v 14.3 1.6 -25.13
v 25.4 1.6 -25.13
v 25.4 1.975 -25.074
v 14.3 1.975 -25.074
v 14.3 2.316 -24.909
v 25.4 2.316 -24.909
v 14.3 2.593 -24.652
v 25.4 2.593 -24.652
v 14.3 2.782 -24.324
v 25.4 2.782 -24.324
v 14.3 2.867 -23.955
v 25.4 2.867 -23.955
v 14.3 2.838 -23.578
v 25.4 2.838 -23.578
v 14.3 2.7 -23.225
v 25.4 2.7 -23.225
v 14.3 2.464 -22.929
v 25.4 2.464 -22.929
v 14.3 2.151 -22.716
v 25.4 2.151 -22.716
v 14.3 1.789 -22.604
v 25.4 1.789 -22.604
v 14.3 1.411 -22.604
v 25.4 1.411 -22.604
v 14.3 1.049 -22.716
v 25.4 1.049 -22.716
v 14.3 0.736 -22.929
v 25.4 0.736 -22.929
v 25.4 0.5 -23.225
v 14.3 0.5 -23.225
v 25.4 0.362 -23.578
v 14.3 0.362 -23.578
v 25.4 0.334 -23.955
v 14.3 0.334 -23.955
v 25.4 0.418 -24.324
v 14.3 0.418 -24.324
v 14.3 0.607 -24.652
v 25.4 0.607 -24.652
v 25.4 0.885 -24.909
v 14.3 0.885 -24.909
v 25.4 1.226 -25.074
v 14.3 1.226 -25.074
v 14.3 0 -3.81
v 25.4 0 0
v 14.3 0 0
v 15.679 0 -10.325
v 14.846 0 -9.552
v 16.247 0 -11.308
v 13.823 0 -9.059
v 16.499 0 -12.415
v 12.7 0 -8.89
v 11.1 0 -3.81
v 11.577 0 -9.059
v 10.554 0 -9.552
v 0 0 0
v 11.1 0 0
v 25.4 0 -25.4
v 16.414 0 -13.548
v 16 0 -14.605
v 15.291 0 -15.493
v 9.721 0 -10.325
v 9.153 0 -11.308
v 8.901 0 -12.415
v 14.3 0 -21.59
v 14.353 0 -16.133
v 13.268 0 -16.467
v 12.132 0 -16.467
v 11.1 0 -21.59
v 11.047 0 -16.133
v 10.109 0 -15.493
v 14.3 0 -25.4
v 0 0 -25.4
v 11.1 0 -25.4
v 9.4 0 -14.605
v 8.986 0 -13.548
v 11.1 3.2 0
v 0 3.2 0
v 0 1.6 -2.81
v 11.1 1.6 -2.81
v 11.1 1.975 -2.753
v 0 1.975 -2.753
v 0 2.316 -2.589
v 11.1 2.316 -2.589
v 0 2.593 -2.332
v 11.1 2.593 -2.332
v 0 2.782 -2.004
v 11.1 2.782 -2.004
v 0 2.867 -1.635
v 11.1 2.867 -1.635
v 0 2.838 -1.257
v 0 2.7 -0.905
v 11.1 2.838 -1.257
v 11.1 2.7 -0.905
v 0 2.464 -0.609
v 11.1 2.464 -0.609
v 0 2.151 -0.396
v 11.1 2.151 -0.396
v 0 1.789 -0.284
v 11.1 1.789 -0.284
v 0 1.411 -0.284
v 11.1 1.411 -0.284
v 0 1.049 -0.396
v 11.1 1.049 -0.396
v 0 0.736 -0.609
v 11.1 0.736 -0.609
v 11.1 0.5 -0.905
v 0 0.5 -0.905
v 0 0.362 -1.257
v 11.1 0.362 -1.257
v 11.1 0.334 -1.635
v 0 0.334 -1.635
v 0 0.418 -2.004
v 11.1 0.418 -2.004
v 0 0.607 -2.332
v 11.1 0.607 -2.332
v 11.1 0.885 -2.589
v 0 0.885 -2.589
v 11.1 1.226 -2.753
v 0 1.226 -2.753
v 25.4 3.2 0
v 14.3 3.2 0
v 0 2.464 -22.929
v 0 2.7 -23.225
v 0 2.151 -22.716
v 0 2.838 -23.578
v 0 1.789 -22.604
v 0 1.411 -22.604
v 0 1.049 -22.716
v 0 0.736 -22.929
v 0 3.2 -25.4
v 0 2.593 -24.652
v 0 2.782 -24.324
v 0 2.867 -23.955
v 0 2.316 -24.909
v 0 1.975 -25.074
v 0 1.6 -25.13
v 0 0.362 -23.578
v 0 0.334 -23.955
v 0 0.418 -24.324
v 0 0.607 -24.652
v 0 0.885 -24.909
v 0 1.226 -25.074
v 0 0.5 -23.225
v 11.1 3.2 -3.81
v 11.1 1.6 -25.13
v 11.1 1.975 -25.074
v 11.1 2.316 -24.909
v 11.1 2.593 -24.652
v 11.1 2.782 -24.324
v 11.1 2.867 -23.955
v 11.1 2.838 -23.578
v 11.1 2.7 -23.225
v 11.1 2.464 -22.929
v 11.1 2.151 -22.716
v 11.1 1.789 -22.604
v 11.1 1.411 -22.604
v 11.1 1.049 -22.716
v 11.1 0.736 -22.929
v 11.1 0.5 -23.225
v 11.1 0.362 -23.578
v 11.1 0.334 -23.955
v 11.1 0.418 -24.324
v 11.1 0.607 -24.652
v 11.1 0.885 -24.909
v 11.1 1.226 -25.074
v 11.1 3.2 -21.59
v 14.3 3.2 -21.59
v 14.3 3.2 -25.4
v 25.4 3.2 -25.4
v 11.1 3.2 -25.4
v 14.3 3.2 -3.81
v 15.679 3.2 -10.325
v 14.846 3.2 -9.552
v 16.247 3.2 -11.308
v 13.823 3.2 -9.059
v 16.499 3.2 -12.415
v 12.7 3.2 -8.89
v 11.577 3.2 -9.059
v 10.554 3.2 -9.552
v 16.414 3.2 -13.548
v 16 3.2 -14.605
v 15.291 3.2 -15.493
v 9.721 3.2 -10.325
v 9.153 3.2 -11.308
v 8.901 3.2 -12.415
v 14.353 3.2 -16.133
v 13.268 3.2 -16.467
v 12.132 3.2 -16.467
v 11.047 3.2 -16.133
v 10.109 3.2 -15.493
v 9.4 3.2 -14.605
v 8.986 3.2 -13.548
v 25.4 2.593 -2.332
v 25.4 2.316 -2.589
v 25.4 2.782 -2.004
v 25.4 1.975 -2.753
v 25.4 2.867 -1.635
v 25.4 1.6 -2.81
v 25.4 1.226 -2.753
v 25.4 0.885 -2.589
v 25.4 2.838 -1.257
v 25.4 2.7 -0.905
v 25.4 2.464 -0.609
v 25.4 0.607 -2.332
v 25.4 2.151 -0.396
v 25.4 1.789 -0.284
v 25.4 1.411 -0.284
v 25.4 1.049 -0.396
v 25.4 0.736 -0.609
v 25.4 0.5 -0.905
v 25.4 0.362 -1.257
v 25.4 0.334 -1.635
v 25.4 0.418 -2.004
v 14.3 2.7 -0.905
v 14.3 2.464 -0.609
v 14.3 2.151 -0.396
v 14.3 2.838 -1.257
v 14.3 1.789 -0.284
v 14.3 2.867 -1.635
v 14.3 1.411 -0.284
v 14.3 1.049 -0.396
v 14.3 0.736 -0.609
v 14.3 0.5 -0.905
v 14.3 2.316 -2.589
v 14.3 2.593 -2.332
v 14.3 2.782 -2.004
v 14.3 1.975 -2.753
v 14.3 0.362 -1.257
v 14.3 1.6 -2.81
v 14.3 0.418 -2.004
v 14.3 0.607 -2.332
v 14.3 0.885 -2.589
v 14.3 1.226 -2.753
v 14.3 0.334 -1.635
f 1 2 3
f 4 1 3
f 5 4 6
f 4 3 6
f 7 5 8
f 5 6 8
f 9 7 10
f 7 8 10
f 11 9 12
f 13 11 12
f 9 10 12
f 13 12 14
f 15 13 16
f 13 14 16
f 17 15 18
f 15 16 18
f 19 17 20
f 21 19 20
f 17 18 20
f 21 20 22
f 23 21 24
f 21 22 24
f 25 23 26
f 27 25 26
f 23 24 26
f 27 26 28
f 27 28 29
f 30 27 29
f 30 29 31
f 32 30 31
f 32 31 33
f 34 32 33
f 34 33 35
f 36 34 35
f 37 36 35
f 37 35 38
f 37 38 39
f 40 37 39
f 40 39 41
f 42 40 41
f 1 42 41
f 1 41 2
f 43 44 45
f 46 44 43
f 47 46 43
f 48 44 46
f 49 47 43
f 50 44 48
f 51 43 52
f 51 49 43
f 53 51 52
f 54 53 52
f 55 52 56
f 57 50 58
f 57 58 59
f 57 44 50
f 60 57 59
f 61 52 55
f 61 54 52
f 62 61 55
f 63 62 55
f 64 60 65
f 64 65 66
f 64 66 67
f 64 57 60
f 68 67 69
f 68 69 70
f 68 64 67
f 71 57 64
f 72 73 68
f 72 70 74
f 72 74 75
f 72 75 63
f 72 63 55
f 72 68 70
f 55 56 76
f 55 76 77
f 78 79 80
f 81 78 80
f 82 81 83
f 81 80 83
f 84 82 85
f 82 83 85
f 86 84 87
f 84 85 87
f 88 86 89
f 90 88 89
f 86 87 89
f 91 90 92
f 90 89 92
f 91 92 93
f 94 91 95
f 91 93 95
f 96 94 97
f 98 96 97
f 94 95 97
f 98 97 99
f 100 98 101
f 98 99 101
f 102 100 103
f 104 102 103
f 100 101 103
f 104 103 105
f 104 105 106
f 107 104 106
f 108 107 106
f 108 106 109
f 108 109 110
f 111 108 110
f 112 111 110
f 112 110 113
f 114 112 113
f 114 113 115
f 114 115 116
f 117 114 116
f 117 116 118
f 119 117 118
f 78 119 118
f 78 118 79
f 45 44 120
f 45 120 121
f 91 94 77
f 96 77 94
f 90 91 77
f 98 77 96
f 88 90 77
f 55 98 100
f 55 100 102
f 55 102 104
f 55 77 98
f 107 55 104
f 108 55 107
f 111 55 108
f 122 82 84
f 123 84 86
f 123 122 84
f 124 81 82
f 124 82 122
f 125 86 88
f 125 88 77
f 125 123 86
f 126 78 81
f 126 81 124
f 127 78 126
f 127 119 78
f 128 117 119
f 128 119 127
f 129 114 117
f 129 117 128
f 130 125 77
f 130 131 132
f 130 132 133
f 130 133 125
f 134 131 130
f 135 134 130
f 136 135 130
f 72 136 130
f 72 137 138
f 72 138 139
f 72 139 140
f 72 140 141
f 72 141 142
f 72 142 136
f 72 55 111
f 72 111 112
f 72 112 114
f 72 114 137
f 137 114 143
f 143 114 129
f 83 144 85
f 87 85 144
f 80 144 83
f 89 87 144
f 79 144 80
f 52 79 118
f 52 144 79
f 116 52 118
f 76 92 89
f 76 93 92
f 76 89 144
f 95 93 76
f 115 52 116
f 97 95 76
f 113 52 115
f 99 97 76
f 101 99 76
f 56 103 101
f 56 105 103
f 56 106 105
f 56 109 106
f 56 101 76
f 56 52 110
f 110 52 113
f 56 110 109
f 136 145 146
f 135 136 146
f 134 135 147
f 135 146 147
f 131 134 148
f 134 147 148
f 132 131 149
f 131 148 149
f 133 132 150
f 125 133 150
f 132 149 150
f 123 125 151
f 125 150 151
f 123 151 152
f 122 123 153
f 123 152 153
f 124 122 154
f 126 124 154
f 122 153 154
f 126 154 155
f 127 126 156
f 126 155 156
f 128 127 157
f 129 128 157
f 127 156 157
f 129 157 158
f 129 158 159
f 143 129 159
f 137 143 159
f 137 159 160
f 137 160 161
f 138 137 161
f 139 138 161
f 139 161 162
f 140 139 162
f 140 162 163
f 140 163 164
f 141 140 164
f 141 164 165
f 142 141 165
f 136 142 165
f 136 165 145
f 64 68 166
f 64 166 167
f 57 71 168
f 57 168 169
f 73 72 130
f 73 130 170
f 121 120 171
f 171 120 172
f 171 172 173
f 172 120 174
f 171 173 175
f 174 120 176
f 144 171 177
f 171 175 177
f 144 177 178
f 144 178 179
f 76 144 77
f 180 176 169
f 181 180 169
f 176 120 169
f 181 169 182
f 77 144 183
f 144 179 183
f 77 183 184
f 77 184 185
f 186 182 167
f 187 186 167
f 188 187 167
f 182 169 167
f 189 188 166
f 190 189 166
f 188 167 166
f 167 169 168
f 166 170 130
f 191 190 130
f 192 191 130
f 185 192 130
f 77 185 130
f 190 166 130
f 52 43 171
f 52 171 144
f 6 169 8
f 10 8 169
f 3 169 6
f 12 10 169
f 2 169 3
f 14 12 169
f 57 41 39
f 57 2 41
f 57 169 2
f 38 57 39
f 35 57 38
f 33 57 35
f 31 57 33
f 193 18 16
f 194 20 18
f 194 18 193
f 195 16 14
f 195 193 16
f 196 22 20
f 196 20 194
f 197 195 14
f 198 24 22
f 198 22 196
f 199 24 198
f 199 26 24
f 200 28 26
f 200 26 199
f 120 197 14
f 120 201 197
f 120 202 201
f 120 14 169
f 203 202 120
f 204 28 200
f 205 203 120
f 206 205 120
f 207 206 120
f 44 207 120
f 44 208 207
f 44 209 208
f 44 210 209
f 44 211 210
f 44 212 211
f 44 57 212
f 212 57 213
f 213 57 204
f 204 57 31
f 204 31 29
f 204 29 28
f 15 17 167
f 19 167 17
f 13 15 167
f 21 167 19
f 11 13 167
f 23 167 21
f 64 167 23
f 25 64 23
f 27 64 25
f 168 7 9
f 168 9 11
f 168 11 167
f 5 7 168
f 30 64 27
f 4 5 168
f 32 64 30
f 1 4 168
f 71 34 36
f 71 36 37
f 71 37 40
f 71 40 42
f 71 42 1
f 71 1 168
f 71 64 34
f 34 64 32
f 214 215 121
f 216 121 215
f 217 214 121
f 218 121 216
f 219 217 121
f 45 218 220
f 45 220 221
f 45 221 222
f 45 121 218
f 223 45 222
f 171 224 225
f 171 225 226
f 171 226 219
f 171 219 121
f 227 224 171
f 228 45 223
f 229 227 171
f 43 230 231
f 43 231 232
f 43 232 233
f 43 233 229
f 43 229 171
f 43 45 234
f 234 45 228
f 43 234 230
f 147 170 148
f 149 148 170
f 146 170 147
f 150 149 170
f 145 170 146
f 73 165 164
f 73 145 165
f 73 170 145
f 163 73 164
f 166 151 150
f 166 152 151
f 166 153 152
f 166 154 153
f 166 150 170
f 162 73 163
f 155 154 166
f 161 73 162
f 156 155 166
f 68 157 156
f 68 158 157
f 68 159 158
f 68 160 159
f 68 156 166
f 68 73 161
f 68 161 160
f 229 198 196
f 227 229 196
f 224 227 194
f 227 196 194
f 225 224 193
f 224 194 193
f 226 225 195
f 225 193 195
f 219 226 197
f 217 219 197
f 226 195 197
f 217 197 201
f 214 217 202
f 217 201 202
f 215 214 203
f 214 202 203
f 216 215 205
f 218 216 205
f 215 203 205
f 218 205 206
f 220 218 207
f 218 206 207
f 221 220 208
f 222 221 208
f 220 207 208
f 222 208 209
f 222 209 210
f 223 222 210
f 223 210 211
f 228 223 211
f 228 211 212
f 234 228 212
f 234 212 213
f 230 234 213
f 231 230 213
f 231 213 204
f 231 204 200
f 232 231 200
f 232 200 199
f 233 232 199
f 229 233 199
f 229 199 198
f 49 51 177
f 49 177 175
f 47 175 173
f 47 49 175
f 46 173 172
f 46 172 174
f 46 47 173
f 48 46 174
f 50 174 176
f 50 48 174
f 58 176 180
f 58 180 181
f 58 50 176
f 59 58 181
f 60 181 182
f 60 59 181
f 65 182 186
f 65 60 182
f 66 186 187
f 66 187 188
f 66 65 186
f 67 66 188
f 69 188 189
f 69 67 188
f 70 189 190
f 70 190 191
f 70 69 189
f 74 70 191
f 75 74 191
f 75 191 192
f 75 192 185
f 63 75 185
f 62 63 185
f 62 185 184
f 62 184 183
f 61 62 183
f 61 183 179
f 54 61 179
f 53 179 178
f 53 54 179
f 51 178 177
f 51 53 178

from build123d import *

# Parameters (mm, degrees)
SKETCH1_R           = 3.81
BOSS_EXTRUDE1_DEPTH = 3.2004
SKETCH3_R           = 1.27
CUT_EXTRUDE2_DEPTH  = 37.063313217


with BuildPart() as part:
    # Sketch1 → Boss-Extrude1 (new body)
    with BuildSketch(Plane(origin=(0, 0, 0), x_dir=(1, 0, 0), z_dir=(0, 1, 0))):
        Polygon((0, 25.4), (11.0998, 25.4), (11.0998, 21.59), (14.3002, 21.59), (14.3002, 25.4), (25.4, 25.4), (25.4, 0), (14.3002, 0), (14.3002, 3.81), (11.0998, 3.81), (11.0998, 0), (0, 0), align=None)
        with Locations(Location((12.7, 12.7, 0), (0, 0, 270))):
            Circle(SKETCH1_R, mode=Mode.SUBTRACT)
    extrude(amount=BOSS_EXTRUDE1_DEPTH)

    # Sketch3 → Cut-Extrude2 (cut, through all)
    with BuildSketch(Plane(origin=(25.4, 0, 0), x_dir=(0, 0, -1), z_dir=(1, 0, 0))):
        with Locations((23.860164918, 1.6002)):
            Circle(SKETCH3_R)
        with Locations((1.539835082, 1.6002)):
            Circle(SKETCH3_R)
    extrude(amount=-CUT_EXTRUDE2_DEPTH, mode=Mode.SUBTRACT)


solid = part.part
